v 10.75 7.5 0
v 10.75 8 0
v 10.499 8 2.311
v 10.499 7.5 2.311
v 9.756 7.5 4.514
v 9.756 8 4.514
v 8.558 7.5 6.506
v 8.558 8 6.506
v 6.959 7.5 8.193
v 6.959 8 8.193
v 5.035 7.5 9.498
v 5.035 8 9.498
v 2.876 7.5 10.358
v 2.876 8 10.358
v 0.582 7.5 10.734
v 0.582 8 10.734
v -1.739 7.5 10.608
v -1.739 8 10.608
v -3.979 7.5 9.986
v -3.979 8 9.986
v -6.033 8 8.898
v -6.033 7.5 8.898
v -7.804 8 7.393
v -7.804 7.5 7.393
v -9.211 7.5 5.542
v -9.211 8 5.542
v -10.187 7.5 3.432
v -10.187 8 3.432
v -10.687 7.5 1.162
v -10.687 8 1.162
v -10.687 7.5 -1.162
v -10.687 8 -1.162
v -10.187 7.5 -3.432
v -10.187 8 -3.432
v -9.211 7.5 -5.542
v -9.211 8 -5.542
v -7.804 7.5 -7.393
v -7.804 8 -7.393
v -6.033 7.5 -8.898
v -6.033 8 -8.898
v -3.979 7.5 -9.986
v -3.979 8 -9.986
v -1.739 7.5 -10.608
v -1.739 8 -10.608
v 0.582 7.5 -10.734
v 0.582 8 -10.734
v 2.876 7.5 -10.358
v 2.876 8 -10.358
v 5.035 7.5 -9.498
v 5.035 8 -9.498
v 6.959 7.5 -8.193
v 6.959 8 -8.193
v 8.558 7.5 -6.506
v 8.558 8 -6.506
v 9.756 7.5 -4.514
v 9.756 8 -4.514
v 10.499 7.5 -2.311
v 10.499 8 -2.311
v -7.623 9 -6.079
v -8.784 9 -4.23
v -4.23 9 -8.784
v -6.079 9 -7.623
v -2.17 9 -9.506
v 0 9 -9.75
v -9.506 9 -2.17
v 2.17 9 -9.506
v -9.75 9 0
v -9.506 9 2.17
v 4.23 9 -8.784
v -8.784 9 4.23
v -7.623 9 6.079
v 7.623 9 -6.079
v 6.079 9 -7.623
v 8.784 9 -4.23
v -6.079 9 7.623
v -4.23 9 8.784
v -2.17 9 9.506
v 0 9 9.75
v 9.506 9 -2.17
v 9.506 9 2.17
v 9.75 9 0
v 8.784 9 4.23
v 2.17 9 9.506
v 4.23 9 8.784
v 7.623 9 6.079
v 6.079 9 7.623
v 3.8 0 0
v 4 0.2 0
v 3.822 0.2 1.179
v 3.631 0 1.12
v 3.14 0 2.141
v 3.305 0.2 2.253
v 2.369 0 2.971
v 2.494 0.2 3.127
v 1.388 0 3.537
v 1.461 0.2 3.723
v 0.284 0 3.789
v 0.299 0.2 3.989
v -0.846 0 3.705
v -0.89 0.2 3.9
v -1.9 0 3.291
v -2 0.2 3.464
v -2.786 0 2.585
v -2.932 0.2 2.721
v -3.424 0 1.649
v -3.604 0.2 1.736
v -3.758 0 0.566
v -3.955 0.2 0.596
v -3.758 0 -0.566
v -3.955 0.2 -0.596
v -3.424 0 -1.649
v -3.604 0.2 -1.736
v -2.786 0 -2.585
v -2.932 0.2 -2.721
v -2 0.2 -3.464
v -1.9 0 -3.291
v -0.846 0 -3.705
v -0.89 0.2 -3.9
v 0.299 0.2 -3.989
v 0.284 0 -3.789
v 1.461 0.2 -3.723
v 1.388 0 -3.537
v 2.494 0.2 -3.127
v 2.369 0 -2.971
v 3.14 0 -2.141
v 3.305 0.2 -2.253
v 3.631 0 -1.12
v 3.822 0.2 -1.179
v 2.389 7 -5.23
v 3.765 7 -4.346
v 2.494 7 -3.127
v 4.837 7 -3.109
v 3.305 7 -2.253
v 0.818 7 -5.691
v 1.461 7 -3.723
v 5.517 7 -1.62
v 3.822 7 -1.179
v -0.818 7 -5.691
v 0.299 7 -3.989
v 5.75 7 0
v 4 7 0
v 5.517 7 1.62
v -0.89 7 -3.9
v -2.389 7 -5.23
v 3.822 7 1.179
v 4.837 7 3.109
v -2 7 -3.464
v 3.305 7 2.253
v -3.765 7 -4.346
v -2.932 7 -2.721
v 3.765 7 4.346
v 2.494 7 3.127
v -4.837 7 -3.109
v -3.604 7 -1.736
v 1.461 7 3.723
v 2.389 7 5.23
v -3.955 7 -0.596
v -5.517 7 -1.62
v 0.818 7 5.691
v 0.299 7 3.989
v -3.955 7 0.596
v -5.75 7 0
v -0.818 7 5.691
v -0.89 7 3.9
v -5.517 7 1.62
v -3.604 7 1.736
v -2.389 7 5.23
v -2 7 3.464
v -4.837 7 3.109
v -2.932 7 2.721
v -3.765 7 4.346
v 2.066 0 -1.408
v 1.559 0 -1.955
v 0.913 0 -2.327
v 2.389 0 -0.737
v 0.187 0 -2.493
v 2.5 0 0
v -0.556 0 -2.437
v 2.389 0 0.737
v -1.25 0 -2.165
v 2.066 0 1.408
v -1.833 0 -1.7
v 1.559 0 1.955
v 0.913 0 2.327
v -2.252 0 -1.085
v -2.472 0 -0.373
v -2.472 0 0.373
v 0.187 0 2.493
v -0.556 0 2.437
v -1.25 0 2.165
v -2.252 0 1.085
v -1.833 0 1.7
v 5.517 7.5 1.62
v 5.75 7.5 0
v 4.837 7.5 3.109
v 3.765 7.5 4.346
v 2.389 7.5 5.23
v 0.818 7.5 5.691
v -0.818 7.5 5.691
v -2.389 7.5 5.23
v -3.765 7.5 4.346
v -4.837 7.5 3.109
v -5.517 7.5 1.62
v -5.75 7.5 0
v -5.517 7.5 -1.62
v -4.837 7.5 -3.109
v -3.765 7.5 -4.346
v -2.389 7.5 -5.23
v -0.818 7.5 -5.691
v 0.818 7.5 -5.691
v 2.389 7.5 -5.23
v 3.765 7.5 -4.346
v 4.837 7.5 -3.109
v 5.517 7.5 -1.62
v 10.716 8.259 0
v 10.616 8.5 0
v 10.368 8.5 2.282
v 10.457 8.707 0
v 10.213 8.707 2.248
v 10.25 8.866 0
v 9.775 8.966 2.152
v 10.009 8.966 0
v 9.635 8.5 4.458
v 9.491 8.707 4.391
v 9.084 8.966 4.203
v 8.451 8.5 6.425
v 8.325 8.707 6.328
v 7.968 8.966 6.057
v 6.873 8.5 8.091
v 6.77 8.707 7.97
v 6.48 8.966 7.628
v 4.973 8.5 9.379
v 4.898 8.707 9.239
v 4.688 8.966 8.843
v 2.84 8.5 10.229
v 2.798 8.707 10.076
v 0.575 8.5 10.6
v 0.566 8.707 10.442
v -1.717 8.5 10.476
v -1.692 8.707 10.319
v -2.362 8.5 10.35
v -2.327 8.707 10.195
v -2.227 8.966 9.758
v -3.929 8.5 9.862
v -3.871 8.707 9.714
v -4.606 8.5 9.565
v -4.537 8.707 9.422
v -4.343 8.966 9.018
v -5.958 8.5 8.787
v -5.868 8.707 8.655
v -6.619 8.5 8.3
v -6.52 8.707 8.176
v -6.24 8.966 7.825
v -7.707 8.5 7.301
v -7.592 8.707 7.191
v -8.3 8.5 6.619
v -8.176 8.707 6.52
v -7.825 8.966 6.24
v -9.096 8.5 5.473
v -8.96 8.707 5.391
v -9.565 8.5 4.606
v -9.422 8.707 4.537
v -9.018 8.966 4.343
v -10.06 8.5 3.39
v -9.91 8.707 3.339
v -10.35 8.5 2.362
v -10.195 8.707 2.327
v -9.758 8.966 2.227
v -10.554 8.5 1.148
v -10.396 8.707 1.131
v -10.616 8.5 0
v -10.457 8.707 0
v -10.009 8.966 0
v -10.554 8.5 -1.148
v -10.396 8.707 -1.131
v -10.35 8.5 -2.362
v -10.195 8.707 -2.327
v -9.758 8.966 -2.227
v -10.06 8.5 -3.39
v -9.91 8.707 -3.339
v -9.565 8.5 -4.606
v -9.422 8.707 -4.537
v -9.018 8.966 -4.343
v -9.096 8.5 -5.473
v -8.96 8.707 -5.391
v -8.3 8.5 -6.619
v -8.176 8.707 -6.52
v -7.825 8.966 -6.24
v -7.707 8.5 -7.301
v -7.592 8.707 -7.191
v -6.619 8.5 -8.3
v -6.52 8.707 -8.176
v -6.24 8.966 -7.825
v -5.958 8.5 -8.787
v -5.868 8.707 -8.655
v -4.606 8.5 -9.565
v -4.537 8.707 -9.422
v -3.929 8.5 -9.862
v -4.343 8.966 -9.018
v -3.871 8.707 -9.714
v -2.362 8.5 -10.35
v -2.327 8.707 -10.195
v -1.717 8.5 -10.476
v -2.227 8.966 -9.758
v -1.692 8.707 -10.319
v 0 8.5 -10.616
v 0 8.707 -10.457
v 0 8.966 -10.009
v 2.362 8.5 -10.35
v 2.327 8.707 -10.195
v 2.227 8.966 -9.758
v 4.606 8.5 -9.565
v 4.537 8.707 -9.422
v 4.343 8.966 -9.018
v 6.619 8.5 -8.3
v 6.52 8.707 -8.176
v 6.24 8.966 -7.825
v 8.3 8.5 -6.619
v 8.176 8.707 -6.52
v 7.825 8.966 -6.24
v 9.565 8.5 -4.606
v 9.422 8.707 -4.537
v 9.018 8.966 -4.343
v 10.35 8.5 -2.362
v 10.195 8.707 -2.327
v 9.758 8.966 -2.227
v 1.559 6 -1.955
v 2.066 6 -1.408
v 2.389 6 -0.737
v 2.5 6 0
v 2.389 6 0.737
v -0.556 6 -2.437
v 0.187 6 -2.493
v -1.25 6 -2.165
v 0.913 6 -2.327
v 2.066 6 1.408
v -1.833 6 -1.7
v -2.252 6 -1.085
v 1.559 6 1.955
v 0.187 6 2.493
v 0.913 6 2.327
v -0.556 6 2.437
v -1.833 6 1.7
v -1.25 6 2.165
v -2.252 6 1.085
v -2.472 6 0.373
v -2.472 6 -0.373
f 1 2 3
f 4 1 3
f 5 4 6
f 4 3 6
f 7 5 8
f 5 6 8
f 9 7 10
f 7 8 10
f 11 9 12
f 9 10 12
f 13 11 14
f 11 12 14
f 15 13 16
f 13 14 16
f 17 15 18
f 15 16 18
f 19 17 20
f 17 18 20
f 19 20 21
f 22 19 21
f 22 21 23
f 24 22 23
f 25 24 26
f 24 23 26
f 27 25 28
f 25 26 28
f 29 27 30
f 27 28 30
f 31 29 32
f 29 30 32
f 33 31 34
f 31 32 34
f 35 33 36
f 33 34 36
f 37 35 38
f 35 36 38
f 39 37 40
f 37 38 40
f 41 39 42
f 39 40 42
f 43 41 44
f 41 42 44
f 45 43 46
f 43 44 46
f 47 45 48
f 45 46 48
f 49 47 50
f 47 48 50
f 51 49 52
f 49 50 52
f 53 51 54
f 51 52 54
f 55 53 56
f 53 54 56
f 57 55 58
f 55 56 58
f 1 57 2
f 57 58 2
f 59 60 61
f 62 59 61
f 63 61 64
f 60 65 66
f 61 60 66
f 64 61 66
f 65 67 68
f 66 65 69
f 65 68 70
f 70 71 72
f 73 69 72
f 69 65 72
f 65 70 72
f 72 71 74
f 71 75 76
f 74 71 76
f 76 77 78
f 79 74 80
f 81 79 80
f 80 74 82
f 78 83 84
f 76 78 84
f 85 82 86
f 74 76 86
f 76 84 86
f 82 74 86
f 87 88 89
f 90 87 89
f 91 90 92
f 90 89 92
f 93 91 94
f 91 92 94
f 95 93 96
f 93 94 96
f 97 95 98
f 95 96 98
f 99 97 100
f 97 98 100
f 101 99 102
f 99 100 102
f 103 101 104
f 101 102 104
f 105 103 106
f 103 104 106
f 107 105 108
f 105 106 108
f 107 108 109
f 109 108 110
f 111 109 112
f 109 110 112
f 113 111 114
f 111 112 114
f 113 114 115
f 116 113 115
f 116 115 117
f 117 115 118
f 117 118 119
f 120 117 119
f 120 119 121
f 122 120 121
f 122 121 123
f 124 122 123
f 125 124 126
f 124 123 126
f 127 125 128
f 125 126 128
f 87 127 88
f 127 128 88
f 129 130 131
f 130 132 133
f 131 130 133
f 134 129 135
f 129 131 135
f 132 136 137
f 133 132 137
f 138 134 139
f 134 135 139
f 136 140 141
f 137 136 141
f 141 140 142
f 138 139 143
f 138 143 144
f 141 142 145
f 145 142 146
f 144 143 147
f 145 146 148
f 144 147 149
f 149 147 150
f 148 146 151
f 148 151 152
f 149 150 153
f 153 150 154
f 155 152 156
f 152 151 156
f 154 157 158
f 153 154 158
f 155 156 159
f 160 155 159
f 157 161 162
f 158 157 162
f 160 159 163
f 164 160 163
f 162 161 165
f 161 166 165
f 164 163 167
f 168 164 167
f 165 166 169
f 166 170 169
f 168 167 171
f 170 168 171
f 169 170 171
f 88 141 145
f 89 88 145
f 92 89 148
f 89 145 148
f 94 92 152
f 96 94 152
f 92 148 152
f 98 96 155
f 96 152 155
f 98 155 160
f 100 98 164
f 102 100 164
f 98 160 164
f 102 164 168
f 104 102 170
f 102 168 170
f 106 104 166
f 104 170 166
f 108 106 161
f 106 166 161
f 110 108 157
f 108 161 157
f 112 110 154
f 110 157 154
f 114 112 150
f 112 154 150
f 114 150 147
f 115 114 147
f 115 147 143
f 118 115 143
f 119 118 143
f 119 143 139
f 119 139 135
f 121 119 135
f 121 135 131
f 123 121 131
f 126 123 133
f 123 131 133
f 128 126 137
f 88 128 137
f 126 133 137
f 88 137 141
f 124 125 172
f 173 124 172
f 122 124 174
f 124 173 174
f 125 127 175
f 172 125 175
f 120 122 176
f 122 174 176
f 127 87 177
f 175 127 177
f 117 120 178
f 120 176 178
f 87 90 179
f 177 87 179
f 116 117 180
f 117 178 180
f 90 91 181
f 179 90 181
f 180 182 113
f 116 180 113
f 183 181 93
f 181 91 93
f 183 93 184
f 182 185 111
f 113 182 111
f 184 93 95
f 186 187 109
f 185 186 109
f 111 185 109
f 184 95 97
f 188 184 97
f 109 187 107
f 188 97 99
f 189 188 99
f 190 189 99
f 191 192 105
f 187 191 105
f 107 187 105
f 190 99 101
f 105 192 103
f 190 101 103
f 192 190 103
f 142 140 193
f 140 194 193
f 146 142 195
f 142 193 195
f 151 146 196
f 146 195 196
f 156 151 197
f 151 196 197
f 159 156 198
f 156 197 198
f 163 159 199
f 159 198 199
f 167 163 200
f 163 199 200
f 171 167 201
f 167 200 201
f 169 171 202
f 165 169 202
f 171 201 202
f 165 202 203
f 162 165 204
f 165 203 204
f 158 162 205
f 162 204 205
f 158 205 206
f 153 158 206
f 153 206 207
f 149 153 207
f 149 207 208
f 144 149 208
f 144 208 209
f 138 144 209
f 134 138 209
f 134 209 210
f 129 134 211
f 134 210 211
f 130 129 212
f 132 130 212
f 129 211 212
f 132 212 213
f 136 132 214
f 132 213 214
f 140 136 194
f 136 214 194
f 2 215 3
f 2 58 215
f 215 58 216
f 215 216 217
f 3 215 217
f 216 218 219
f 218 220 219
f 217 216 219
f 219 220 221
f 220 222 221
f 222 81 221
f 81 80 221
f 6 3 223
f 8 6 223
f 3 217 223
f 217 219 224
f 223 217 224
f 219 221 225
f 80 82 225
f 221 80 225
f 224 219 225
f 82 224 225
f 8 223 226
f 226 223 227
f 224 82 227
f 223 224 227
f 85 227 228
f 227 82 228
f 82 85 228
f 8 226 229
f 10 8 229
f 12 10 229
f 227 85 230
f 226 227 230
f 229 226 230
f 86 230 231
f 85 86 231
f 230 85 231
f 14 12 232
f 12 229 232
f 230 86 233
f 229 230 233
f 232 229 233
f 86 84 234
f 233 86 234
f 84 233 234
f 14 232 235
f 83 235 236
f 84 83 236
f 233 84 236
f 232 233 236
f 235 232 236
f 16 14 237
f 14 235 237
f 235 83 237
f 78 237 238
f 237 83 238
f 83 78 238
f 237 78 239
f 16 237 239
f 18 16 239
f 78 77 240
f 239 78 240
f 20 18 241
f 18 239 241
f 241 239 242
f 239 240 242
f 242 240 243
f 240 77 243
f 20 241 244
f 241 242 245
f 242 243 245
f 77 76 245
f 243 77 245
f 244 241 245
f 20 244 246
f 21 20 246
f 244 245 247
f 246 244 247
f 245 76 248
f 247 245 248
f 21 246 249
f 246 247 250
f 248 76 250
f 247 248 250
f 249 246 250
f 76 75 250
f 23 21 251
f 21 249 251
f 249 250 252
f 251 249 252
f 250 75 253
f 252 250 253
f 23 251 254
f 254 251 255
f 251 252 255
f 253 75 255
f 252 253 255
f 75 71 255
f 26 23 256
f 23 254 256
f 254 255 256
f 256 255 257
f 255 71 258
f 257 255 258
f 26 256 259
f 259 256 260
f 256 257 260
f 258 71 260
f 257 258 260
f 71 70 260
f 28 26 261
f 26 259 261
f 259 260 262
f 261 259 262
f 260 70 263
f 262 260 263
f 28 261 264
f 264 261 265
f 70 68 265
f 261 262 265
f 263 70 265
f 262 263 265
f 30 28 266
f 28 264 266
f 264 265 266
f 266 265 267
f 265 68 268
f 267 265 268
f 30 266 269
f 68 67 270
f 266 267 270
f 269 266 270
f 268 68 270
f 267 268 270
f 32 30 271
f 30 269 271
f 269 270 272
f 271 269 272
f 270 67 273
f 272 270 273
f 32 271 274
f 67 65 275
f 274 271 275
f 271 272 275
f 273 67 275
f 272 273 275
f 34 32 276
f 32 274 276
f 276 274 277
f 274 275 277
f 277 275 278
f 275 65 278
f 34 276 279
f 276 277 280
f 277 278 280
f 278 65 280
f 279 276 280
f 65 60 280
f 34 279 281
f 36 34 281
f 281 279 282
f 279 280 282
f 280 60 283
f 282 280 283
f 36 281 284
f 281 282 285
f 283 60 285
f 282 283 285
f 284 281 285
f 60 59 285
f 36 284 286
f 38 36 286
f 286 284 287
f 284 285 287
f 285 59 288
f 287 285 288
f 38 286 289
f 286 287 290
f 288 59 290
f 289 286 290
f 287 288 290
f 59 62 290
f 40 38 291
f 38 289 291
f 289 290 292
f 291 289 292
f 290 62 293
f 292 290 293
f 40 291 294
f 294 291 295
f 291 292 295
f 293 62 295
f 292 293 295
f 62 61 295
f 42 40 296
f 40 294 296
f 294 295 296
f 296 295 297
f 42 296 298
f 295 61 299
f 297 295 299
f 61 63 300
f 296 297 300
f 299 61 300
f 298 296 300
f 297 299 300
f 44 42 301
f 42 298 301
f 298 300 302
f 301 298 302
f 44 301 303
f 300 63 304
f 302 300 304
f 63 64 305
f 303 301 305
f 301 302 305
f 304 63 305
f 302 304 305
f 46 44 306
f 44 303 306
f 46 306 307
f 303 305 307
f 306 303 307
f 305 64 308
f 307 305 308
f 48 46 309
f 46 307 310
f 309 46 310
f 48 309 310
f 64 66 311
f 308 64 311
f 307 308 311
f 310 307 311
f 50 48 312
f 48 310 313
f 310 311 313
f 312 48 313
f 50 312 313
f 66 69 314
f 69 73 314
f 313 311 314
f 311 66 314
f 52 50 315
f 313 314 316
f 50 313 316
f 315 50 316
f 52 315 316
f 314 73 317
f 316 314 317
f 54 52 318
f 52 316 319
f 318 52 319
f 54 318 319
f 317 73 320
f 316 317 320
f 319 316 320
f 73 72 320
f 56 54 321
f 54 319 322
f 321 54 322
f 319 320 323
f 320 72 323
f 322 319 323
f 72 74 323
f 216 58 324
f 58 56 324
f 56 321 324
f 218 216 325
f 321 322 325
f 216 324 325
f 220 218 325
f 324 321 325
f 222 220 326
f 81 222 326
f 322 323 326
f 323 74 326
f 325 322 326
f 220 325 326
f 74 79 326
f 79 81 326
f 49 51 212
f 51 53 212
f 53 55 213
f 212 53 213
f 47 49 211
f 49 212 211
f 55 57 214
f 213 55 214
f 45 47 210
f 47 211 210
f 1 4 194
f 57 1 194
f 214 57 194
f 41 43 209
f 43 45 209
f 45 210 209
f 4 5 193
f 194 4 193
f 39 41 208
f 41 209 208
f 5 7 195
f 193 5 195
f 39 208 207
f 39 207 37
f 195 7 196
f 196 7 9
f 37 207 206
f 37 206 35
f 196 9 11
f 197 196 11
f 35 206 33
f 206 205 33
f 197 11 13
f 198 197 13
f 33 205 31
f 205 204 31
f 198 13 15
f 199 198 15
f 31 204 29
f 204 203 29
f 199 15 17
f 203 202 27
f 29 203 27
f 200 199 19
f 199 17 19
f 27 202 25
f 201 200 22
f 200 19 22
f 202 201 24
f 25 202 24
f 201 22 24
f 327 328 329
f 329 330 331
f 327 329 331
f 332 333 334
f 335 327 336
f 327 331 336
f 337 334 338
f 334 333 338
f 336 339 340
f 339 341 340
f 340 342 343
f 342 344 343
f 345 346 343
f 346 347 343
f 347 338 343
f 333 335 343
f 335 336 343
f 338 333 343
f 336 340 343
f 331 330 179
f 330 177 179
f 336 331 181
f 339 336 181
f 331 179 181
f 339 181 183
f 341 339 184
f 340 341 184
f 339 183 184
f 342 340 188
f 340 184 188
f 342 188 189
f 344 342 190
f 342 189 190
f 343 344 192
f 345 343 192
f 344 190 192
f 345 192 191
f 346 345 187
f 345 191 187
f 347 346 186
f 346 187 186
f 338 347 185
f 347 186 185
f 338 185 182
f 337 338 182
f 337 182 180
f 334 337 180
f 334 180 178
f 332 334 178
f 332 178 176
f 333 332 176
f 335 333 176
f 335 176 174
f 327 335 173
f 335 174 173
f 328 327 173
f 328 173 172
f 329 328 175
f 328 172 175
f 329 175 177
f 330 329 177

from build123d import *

# Parameters (mm, degrees)
F2_SIZE = 0.2
F3_R    = 1


with BuildPart() as f1:
    # F0 (on Top) → F1 (revolve)
    with BuildSketch(Plane.XY):
        Polygon((2.5, 6), (2.5, 0), (4, 0), (4, 7), (5.75, 7), (5.75, 7.5), (10.75, 7.5), (10.75, 9), (0, 9), (0, 6), align=None)
    revolve(axis=Axis((0, 5.832618, 0), (0, -1, 0)))

    # F2
    f2_edges = [f1.edges().sort_by_distance(p)[0] for p in [
        (-4, 0, 0),
    ]]
    chamfer(f2_edges, length=F2_SIZE)

    # F3
    f3_edges = [f1.edges().sort_by_distance(p)[0] for p in [
        (-10.75, 9, 0),
    ]]
    fillet(f3_edges, radius=F3_R)


solid = f1.part
